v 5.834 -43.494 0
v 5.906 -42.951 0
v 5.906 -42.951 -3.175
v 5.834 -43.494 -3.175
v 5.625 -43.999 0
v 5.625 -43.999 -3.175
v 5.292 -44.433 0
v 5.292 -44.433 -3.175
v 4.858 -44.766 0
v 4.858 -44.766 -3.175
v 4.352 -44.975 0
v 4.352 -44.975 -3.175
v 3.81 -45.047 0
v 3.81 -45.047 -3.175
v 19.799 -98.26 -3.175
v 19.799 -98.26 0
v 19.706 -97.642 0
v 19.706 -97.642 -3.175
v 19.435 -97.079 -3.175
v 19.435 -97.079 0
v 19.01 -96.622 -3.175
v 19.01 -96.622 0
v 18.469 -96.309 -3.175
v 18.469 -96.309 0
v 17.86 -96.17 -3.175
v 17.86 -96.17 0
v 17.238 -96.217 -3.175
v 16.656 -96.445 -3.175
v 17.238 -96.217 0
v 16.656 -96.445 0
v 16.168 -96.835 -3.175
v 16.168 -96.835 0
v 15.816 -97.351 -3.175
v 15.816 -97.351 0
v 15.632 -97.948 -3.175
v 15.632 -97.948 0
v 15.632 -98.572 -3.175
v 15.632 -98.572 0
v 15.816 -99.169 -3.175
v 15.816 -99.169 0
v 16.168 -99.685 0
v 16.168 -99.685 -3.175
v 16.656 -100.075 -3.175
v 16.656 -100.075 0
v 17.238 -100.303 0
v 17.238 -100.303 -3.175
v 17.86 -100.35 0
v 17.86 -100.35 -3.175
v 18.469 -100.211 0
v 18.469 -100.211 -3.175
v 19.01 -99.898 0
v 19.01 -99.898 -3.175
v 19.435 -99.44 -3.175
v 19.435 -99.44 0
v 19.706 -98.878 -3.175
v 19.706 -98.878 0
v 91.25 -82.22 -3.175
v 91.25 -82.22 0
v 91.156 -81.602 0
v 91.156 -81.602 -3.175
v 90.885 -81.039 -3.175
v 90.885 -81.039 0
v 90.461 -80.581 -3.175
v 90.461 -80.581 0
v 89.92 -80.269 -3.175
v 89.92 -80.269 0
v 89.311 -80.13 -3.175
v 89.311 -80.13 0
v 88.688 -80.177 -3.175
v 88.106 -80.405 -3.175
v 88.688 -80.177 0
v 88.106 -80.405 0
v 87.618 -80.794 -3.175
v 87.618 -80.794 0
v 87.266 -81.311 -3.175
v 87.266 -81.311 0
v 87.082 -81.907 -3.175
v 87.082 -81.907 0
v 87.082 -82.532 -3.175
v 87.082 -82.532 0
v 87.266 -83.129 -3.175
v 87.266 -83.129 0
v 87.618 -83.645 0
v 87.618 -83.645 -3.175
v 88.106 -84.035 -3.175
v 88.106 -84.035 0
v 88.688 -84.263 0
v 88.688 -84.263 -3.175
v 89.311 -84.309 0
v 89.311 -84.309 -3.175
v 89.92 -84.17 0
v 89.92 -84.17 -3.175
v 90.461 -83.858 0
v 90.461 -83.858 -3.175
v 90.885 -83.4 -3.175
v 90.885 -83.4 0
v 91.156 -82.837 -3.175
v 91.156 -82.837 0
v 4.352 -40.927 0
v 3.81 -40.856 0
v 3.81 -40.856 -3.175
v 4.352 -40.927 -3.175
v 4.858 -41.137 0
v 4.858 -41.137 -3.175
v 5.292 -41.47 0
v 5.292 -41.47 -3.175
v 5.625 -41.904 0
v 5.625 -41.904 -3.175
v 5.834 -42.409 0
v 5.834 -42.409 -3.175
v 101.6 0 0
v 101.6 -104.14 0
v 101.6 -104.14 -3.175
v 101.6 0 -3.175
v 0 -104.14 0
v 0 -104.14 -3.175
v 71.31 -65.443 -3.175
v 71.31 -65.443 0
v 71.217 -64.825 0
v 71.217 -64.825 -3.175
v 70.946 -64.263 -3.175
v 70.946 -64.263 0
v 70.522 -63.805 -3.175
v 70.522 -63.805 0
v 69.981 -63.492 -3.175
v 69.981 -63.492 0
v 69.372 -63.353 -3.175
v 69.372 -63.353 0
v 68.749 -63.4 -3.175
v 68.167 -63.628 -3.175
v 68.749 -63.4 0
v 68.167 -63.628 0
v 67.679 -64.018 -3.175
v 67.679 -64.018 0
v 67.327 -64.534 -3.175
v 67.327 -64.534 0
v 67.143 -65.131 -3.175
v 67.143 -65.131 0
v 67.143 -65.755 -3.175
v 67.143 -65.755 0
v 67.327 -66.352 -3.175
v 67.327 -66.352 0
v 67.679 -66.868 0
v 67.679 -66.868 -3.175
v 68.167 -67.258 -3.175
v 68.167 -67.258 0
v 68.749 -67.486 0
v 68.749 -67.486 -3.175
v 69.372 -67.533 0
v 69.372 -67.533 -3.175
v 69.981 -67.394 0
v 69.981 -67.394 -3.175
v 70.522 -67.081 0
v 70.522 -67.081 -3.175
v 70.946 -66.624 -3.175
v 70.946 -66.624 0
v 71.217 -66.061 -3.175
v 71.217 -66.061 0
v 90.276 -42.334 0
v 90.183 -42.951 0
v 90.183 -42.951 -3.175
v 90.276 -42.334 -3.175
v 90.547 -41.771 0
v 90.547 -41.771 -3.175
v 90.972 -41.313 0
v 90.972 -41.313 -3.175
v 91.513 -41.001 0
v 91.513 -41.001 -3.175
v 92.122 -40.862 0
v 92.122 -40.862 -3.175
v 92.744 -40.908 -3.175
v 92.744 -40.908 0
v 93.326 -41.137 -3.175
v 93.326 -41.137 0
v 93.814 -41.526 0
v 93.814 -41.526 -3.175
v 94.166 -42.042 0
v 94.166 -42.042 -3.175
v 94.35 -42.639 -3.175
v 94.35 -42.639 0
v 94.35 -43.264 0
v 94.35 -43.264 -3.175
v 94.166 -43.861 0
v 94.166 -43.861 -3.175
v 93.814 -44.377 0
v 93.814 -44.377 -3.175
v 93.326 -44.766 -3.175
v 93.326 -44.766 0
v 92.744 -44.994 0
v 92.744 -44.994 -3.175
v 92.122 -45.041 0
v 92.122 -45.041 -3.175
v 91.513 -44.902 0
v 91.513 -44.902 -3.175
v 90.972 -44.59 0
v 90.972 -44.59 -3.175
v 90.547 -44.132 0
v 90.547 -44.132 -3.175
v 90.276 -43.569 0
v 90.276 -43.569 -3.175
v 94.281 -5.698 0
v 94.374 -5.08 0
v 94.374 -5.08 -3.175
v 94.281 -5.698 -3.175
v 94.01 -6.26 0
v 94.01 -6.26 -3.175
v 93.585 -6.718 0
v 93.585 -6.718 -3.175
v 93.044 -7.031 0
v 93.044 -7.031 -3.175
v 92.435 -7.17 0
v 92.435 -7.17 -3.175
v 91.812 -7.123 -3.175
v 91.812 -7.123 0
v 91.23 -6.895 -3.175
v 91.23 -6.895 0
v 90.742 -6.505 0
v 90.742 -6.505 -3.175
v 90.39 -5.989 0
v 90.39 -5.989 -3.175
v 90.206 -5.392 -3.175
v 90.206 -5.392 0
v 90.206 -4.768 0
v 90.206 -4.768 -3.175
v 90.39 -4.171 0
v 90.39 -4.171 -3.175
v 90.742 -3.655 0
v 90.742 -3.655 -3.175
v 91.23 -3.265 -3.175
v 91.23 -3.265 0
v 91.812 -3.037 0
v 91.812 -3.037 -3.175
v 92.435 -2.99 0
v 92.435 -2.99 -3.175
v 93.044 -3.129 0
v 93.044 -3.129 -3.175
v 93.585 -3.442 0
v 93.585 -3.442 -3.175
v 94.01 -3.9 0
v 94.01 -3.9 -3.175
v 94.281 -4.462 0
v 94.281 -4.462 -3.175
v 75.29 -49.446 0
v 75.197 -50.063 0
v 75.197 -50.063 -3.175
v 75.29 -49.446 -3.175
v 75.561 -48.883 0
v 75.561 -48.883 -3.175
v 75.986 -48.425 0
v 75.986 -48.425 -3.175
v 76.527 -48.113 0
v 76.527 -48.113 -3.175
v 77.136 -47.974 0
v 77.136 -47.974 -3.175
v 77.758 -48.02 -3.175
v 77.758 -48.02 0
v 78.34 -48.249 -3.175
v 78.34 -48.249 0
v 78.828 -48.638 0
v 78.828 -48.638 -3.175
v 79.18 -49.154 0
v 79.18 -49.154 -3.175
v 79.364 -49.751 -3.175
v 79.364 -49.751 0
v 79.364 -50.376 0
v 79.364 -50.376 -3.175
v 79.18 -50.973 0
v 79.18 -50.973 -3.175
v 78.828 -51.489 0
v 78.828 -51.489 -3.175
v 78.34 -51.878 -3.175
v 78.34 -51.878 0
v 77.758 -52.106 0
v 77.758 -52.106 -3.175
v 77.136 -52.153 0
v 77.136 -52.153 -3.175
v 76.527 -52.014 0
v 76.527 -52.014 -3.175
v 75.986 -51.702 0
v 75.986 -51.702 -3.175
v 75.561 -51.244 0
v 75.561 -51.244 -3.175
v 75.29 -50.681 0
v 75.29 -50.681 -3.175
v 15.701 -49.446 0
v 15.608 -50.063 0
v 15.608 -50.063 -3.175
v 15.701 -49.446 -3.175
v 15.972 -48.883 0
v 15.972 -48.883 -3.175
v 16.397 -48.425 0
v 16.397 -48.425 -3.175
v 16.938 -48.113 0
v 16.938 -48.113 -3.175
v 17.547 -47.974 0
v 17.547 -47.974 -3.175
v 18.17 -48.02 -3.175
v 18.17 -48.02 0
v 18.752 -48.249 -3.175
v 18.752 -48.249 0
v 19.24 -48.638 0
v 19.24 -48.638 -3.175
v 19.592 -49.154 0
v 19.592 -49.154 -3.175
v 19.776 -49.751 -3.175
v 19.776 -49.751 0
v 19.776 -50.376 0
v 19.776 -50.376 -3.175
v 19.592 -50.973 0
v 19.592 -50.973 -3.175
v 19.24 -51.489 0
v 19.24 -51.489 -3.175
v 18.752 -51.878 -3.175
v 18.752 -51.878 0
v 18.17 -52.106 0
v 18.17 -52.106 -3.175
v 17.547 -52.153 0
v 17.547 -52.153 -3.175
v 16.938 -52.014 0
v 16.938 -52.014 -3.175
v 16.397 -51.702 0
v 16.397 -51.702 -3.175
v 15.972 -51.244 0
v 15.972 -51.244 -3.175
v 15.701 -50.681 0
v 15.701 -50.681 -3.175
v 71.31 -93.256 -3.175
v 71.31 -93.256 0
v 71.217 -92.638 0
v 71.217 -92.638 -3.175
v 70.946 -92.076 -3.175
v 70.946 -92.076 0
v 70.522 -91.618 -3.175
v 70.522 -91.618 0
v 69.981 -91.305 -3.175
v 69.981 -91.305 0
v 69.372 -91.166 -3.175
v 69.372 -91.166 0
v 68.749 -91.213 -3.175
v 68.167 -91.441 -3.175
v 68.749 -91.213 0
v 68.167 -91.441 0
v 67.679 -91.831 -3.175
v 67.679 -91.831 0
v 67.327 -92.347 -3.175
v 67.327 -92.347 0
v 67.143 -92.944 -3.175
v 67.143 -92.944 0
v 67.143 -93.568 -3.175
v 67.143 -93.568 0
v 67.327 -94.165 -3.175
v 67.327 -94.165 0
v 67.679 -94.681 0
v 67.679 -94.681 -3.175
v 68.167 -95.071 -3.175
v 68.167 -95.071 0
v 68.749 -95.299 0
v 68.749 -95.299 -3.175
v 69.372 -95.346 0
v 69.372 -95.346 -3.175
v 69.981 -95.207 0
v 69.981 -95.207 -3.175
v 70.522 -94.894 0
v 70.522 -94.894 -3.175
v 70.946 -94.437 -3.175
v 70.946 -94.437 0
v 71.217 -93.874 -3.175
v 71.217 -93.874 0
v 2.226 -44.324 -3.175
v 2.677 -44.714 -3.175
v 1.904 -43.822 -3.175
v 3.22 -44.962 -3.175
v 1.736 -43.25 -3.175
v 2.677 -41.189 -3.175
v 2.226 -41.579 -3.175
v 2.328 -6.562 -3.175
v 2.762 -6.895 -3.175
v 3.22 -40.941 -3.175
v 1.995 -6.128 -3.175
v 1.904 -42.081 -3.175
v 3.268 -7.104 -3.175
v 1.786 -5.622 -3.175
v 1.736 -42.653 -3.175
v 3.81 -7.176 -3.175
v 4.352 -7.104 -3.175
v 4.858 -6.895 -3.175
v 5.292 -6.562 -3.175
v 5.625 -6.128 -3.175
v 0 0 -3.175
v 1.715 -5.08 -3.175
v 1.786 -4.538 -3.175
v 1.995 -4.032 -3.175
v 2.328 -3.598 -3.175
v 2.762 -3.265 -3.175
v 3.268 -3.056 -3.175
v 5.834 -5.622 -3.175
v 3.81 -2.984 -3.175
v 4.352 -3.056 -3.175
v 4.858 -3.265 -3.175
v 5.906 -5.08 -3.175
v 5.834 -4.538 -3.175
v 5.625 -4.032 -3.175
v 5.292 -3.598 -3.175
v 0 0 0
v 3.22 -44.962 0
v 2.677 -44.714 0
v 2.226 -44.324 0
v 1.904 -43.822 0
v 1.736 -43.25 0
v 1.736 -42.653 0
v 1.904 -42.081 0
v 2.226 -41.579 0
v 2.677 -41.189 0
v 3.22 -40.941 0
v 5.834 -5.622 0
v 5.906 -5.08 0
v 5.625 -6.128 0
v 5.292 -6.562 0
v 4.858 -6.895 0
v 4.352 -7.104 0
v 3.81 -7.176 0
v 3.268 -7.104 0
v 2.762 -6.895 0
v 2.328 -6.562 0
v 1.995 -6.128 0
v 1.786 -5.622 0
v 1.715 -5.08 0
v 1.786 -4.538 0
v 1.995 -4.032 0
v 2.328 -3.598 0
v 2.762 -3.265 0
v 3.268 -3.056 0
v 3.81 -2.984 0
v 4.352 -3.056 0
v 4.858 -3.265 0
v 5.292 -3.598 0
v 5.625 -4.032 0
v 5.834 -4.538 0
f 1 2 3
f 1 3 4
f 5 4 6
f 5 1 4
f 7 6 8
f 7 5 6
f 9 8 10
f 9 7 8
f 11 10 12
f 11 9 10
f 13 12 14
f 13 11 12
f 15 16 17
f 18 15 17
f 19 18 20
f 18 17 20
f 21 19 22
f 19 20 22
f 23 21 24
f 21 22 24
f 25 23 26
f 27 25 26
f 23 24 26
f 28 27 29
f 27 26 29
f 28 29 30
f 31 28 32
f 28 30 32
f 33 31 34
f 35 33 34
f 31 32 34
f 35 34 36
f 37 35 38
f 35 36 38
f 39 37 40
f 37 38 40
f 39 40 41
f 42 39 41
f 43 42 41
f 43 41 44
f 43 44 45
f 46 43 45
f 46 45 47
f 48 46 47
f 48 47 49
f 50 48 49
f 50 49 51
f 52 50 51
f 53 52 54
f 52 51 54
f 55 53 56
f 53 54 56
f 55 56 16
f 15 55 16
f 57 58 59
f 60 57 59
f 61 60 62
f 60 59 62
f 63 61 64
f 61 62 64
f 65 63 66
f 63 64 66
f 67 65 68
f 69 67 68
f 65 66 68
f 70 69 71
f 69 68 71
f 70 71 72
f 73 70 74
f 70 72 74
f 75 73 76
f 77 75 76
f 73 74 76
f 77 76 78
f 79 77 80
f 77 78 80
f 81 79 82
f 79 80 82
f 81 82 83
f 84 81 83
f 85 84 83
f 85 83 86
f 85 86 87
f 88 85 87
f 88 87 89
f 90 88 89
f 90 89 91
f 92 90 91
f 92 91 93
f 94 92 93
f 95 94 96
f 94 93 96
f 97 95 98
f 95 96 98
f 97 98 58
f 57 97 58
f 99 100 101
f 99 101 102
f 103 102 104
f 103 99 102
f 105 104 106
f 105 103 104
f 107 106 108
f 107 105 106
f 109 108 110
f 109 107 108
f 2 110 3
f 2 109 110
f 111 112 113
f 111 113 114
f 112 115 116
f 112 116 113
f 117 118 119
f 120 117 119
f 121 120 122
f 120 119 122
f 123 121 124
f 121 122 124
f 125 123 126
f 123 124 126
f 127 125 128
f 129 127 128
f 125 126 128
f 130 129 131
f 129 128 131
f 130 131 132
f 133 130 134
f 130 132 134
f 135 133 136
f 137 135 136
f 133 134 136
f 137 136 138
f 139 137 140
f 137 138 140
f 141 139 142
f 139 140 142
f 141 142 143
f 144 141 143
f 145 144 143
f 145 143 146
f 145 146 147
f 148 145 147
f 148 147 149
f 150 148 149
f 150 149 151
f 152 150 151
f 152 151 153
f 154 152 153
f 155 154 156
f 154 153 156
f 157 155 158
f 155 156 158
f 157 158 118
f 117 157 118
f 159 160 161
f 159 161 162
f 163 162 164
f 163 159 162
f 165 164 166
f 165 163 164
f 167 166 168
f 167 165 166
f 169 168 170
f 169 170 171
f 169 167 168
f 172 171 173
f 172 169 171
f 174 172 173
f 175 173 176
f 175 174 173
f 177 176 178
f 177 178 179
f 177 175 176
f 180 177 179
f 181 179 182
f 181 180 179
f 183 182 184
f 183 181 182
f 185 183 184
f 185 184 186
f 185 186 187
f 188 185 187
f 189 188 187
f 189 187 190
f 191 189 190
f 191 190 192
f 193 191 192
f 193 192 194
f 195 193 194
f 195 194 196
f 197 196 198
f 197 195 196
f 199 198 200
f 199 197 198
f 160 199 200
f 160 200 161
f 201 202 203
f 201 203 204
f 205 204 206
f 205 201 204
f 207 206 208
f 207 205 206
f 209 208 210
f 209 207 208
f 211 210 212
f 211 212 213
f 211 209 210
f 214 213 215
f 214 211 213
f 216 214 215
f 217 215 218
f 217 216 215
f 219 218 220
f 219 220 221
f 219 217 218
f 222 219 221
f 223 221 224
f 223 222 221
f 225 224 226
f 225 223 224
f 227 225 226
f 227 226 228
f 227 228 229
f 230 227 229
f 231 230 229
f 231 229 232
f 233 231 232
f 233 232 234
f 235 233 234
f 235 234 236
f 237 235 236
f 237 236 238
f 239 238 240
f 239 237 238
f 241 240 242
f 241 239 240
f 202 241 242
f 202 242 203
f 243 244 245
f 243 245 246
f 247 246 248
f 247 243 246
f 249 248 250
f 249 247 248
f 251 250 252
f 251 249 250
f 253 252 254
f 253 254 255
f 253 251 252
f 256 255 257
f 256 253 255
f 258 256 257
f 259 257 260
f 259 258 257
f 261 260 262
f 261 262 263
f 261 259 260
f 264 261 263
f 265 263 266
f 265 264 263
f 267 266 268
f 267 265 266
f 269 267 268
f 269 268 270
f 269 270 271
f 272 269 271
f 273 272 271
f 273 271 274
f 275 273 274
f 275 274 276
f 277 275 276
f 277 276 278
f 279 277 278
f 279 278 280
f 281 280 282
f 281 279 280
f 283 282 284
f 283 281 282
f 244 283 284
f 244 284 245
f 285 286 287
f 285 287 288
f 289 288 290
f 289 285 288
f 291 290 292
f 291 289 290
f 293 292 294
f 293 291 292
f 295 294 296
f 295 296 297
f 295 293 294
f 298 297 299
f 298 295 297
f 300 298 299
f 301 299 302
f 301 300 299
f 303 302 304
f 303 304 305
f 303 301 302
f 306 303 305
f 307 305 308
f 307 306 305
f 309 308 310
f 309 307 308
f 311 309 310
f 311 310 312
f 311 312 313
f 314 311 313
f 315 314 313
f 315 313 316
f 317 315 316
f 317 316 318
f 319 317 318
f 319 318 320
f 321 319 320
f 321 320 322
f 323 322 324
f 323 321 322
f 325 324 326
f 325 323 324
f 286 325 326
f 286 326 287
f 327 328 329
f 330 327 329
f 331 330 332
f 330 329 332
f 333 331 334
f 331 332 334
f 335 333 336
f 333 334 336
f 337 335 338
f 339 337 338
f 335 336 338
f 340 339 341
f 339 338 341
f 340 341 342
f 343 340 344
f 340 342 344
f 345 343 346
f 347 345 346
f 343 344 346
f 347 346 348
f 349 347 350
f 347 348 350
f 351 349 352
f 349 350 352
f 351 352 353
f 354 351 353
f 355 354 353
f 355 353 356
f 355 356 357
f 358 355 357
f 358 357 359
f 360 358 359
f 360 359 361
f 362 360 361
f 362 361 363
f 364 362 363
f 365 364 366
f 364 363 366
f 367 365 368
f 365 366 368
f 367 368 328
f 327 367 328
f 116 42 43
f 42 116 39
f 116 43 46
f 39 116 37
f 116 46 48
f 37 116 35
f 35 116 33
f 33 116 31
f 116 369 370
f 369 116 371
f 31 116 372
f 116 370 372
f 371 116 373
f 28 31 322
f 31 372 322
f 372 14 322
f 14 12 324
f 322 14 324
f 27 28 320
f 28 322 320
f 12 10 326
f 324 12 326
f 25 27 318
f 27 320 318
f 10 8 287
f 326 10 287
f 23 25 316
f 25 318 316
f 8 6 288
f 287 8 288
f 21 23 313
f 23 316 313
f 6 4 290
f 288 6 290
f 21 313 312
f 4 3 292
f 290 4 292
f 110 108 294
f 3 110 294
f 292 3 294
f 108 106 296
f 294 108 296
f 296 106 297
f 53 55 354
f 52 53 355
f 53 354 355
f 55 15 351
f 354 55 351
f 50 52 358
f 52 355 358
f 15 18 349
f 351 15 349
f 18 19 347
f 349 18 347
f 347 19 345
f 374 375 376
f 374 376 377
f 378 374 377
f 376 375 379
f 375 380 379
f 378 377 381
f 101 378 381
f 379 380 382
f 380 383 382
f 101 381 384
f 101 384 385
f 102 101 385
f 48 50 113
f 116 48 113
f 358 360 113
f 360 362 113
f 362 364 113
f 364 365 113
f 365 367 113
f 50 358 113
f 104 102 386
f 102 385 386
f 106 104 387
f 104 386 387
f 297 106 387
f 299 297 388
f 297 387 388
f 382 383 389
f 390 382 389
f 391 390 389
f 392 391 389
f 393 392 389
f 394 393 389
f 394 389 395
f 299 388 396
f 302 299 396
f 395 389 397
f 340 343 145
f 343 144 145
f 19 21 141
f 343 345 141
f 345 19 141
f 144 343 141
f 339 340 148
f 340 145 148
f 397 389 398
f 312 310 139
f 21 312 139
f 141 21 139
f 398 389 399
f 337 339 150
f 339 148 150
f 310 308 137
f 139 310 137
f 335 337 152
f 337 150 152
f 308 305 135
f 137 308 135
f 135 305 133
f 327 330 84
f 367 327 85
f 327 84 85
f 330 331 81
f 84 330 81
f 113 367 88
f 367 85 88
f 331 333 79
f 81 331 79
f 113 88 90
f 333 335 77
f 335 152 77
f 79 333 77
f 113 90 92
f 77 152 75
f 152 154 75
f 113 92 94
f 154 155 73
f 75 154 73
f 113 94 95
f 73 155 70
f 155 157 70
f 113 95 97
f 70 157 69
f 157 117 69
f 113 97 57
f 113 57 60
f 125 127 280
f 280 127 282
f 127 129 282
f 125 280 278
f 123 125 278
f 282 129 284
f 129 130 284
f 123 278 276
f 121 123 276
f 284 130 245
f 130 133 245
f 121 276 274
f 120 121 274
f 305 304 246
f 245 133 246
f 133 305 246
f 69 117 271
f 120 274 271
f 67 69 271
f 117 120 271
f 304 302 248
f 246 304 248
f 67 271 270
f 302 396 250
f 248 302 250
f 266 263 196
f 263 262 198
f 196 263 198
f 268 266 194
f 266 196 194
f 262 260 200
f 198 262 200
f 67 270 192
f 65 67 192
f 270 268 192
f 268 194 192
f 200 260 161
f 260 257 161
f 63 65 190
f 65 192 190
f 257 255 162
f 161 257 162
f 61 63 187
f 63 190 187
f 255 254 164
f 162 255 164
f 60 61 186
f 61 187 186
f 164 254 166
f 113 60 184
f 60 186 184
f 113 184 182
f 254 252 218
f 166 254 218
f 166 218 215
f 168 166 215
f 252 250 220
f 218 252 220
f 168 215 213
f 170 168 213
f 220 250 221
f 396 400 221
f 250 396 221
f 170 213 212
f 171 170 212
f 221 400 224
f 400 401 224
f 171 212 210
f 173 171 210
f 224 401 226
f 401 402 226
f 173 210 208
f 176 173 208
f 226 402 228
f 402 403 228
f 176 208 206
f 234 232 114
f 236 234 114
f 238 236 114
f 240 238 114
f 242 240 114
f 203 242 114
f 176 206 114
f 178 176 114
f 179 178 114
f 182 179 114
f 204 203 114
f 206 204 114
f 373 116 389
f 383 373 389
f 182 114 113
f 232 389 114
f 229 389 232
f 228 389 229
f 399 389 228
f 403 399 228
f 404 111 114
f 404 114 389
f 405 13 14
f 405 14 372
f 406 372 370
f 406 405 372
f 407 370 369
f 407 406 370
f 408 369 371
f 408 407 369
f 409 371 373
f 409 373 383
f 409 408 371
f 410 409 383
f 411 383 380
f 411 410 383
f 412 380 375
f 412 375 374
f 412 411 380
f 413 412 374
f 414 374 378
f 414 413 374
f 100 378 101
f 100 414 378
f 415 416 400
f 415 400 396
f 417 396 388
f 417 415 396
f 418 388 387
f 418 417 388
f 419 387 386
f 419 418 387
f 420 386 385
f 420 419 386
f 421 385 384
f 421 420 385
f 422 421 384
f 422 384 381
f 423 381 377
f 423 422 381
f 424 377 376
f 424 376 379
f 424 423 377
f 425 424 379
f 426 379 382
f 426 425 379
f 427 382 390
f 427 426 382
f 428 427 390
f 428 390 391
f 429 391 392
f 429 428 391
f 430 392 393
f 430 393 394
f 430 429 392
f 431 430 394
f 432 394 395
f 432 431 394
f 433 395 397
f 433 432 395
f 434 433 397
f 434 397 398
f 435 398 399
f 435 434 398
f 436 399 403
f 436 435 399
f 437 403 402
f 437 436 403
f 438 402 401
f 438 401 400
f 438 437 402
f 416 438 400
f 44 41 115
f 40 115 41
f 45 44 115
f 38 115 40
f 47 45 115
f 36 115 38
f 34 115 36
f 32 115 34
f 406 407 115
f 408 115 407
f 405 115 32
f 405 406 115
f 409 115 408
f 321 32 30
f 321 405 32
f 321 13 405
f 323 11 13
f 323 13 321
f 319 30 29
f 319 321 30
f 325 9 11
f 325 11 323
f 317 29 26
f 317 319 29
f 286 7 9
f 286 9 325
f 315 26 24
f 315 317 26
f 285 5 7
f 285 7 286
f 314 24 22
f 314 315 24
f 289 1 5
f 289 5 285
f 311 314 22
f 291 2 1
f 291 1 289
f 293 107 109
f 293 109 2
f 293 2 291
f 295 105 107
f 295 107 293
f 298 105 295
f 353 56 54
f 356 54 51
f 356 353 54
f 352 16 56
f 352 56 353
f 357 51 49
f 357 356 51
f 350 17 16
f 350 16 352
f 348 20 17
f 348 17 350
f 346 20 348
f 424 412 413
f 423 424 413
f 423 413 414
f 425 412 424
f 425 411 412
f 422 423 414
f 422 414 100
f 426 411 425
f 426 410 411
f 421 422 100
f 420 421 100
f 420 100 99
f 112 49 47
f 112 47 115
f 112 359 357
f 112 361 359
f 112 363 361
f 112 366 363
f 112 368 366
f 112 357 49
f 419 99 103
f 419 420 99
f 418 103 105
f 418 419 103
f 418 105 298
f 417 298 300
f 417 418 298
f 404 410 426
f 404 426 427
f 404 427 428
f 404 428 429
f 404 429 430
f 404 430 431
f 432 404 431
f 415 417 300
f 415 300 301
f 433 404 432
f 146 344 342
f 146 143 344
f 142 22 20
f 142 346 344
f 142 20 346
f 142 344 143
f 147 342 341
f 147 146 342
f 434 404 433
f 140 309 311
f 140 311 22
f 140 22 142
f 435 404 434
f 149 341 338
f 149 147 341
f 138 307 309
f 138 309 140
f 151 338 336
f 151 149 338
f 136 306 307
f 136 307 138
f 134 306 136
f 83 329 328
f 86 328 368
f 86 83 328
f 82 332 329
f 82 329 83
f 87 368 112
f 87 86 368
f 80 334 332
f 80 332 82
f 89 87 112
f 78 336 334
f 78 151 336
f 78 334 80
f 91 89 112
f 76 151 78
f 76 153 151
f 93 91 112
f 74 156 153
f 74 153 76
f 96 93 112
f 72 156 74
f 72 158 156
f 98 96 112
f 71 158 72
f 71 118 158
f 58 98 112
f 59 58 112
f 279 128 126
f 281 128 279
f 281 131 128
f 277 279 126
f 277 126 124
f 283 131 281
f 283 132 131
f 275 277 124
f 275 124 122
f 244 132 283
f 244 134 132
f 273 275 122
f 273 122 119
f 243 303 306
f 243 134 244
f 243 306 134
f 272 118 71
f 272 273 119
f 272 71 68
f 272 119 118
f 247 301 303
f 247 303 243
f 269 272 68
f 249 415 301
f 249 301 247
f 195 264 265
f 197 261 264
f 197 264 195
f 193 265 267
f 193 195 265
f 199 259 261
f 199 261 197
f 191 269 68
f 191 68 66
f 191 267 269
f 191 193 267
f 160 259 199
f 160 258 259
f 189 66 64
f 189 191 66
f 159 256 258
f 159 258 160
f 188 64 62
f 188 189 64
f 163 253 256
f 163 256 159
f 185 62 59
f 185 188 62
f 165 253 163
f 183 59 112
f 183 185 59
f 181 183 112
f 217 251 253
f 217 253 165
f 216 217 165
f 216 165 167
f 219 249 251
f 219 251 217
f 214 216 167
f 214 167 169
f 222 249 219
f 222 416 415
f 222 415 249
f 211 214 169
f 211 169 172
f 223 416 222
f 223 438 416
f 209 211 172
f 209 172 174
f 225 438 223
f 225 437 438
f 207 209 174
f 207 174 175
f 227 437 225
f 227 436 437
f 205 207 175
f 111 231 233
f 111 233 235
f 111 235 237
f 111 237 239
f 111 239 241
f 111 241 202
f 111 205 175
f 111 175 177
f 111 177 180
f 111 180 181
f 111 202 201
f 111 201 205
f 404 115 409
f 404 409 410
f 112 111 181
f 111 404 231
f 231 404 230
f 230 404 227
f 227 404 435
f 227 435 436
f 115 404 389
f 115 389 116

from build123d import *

# Parameters (mm, degrees)
F0_R     = 2.0955
F1_DEPTH = 3.175


with BuildPart() as f1:
    # F0 (on Top) → F1 (new body)
    with BuildSketch(Plane.XY):
        with BuildLine():
            Line((3.81, 0), (0, 0))
            Line((0, 0), (0, -5.08))
            Line((0, -5.08), (1.7145, -5.08))
            ThreePointArc((1.7145, -5.08), (2.32825774, -3.59825774), (3.81, -2.9845))
            Line((3.81, -2.9845), (3.81, 0))
        make_face()
        with BuildLine():
            Line((101.6, 0), (3.81, 0))
            Line((3.81, 0), (3.81, -2.9845))
            ThreePointArc((3.81, -2.9845), (5.29174226, -3.59825774), (5.9055, -5.08))
            Line((5.9055, -5.08), (90.1827, -5.08))
            ThreePointArc((90.1827, -5.08), (92.2782, -2.9845), (94.3737, -5.08))
            Line((94.3737, -5.08), (101.6, -5.08))
            Line((101.6, -5.08), (101.6, 0))
        make_face()
        with BuildLine():
            Line((1.7145, -5.08), (0, -5.08))
            Line((0, -5.08), (0, -104.14))
            Line((0, -104.14), (3.81, -104.14))
            Line((3.81, -104.14), (3.81, -50.0634))
            Line((3.81, -50.0634), (3.81, -45.0469))
            ThreePointArc((3.81, -45.0469), (1.7145, -42.9514), (3.81, -40.8559))
            Line((3.81, -40.8559), (3.81, -7.1755))
            ThreePointArc((3.81, -7.1755), (2.32825774, -6.56174226), (1.7145, -5.08))
        make_face()
        with BuildLine():
            Line((101.6, -104.14), (101.6, -5.08))
            Line((101.6, -5.08), (94.3737, -5.08))
            ThreePointArc((94.3737, -5.08), (92.2782, -7.1755), (90.1827, -5.08))
            Line((90.1827, -5.08), (5.9055, -5.08))
            ThreePointArc((5.9055, -5.08), (5.29174226, -6.56174226), (3.81, -7.1755))
            Line((3.81, -7.1755), (3.81, -40.8559))
            ThreePointArc((3.81, -40.8559), (5.29174226, -41.46965774), (5.9055, -42.9514))
            ThreePointArc((5.9055, -42.9514), (5.29174226, -44.43314226), (3.81, -45.0469))
            Line((3.81, -45.0469), (3.81, -50.0634))
            Line((3.81, -50.0634), (3.81, -104.14))
            Line((3.81, -104.14), (101.6, -104.14))
        make_face()
        with Locations((17.7038, -98.2599)):
            Circle(F0_R, mode=Mode.SUBTRACT)
        with Locations((69.215, -93.2561)):
            Circle(F0_R, mode=Mode.SUBTRACT)
        with Locations((89.154, -82.2198)):
            Circle(F0_R, mode=Mode.SUBTRACT)
        with Locations((69.215, -65.4431)):
            Circle(F0_R, mode=Mode.SUBTRACT)
        with BuildLine():
            ThreePointArc((19.7993, -50.0634), (17.7038, -52.1589), (15.6083, -50.0634))
            ThreePointArc((15.6083, -50.0634), (17.7038, -47.9679), (19.7993, -50.0634))
        make_face(mode=Mode.SUBTRACT)
        with BuildLine():
            ThreePointArc((79.3877, -50.0634), (77.2922, -52.1589), (75.1967, -50.0634))
            ThreePointArc((75.1967, -50.0634), (77.2922, -47.9679), (79.3877, -50.0634))
        make_face(mode=Mode.SUBTRACT)
        with BuildLine():
            ThreePointArc((94.3737, -42.9514), (92.2782, -45.0469), (90.1827, -42.9514))
            ThreePointArc((90.1827, -42.9514), (92.2782, -40.8559), (94.3737, -42.9514))
        make_face(mode=Mode.SUBTRACT)
    extrude(amount=-F1_DEPTH)


solid = f1.part
